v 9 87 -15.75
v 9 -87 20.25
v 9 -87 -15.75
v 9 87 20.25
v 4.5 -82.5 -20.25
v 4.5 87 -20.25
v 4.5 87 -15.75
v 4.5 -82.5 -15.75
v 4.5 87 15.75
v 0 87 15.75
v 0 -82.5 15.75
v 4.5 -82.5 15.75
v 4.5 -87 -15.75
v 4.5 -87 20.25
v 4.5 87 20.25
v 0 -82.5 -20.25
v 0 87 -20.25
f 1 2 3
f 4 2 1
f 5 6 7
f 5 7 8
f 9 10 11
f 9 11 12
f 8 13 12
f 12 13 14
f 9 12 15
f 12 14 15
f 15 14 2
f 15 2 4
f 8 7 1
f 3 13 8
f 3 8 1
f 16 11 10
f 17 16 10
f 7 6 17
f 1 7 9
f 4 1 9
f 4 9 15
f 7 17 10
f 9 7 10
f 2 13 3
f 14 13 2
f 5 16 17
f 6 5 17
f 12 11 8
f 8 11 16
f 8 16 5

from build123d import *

# Parameters (mm, degrees)
F0_W     = 174
F0_H     = 40.5
F1_DEPTH = 9
F2_W     = 4.5
F2_H     = 174
F3_DEPTH = 4.5
F4_W     = 4.5
F4_H     = 4.5
F5_DEPTH = 36
F6_W     = 4.5
F6_H     = 4.5
F7_DEPTH = 4.5
F8_W     = 4.5
F8_H     = 169.5
F9_DEPTH = 4.5


with BuildPart() as f1:
    # F0 (on Right) → F1 (new body)
    with BuildSketch(Plane.YZ):
        Rectangle(F0_W, F0_H)
    extrude(amount=F1_DEPTH)

    # F2 (on face) → F3 (cut)
    with BuildSketch(Plane.XY.offset(20.25)):
        with Locations((2.25, 0)):
            Rectangle(F2_W, F2_H)
    extrude(amount=-F3_DEPTH, mode=Mode.SUBTRACT)

    # F4 (on face) → F5 (cut, through all)
    with BuildSketch(Plane.XY.offset(15.75)):
        with Locations((2.25, -84.75)):
            Rectangle(F4_W, F4_H)
    extrude(amount=-F5_DEPTH, mode=Mode.SUBTRACT)

    # F6 (on face) → F7 (cut)
    with BuildSketch(Plane(origin=(0, 0, -20.25), x_dir=(1, 0, 0), z_dir=(0, 0, -1))):
        with Locations((6.75, 84.75)):
            Rectangle(F6_W, F6_H)
    extrude(amount=-F7_DEPTH, mode=Mode.SUBTRACT)

    # F8 (on face) → F9 (cut)
    with BuildSketch(Plane(origin=(0, 0, -20.25), x_dir=(1, 0, 0), z_dir=(0, 0, -1))):
        with Locations((6.75, -2.25)):
            Rectangle(F8_W, F8_H)
    extrude(amount=-F9_DEPTH, mode=Mode.SUBTRACT)


solid = f1.part
